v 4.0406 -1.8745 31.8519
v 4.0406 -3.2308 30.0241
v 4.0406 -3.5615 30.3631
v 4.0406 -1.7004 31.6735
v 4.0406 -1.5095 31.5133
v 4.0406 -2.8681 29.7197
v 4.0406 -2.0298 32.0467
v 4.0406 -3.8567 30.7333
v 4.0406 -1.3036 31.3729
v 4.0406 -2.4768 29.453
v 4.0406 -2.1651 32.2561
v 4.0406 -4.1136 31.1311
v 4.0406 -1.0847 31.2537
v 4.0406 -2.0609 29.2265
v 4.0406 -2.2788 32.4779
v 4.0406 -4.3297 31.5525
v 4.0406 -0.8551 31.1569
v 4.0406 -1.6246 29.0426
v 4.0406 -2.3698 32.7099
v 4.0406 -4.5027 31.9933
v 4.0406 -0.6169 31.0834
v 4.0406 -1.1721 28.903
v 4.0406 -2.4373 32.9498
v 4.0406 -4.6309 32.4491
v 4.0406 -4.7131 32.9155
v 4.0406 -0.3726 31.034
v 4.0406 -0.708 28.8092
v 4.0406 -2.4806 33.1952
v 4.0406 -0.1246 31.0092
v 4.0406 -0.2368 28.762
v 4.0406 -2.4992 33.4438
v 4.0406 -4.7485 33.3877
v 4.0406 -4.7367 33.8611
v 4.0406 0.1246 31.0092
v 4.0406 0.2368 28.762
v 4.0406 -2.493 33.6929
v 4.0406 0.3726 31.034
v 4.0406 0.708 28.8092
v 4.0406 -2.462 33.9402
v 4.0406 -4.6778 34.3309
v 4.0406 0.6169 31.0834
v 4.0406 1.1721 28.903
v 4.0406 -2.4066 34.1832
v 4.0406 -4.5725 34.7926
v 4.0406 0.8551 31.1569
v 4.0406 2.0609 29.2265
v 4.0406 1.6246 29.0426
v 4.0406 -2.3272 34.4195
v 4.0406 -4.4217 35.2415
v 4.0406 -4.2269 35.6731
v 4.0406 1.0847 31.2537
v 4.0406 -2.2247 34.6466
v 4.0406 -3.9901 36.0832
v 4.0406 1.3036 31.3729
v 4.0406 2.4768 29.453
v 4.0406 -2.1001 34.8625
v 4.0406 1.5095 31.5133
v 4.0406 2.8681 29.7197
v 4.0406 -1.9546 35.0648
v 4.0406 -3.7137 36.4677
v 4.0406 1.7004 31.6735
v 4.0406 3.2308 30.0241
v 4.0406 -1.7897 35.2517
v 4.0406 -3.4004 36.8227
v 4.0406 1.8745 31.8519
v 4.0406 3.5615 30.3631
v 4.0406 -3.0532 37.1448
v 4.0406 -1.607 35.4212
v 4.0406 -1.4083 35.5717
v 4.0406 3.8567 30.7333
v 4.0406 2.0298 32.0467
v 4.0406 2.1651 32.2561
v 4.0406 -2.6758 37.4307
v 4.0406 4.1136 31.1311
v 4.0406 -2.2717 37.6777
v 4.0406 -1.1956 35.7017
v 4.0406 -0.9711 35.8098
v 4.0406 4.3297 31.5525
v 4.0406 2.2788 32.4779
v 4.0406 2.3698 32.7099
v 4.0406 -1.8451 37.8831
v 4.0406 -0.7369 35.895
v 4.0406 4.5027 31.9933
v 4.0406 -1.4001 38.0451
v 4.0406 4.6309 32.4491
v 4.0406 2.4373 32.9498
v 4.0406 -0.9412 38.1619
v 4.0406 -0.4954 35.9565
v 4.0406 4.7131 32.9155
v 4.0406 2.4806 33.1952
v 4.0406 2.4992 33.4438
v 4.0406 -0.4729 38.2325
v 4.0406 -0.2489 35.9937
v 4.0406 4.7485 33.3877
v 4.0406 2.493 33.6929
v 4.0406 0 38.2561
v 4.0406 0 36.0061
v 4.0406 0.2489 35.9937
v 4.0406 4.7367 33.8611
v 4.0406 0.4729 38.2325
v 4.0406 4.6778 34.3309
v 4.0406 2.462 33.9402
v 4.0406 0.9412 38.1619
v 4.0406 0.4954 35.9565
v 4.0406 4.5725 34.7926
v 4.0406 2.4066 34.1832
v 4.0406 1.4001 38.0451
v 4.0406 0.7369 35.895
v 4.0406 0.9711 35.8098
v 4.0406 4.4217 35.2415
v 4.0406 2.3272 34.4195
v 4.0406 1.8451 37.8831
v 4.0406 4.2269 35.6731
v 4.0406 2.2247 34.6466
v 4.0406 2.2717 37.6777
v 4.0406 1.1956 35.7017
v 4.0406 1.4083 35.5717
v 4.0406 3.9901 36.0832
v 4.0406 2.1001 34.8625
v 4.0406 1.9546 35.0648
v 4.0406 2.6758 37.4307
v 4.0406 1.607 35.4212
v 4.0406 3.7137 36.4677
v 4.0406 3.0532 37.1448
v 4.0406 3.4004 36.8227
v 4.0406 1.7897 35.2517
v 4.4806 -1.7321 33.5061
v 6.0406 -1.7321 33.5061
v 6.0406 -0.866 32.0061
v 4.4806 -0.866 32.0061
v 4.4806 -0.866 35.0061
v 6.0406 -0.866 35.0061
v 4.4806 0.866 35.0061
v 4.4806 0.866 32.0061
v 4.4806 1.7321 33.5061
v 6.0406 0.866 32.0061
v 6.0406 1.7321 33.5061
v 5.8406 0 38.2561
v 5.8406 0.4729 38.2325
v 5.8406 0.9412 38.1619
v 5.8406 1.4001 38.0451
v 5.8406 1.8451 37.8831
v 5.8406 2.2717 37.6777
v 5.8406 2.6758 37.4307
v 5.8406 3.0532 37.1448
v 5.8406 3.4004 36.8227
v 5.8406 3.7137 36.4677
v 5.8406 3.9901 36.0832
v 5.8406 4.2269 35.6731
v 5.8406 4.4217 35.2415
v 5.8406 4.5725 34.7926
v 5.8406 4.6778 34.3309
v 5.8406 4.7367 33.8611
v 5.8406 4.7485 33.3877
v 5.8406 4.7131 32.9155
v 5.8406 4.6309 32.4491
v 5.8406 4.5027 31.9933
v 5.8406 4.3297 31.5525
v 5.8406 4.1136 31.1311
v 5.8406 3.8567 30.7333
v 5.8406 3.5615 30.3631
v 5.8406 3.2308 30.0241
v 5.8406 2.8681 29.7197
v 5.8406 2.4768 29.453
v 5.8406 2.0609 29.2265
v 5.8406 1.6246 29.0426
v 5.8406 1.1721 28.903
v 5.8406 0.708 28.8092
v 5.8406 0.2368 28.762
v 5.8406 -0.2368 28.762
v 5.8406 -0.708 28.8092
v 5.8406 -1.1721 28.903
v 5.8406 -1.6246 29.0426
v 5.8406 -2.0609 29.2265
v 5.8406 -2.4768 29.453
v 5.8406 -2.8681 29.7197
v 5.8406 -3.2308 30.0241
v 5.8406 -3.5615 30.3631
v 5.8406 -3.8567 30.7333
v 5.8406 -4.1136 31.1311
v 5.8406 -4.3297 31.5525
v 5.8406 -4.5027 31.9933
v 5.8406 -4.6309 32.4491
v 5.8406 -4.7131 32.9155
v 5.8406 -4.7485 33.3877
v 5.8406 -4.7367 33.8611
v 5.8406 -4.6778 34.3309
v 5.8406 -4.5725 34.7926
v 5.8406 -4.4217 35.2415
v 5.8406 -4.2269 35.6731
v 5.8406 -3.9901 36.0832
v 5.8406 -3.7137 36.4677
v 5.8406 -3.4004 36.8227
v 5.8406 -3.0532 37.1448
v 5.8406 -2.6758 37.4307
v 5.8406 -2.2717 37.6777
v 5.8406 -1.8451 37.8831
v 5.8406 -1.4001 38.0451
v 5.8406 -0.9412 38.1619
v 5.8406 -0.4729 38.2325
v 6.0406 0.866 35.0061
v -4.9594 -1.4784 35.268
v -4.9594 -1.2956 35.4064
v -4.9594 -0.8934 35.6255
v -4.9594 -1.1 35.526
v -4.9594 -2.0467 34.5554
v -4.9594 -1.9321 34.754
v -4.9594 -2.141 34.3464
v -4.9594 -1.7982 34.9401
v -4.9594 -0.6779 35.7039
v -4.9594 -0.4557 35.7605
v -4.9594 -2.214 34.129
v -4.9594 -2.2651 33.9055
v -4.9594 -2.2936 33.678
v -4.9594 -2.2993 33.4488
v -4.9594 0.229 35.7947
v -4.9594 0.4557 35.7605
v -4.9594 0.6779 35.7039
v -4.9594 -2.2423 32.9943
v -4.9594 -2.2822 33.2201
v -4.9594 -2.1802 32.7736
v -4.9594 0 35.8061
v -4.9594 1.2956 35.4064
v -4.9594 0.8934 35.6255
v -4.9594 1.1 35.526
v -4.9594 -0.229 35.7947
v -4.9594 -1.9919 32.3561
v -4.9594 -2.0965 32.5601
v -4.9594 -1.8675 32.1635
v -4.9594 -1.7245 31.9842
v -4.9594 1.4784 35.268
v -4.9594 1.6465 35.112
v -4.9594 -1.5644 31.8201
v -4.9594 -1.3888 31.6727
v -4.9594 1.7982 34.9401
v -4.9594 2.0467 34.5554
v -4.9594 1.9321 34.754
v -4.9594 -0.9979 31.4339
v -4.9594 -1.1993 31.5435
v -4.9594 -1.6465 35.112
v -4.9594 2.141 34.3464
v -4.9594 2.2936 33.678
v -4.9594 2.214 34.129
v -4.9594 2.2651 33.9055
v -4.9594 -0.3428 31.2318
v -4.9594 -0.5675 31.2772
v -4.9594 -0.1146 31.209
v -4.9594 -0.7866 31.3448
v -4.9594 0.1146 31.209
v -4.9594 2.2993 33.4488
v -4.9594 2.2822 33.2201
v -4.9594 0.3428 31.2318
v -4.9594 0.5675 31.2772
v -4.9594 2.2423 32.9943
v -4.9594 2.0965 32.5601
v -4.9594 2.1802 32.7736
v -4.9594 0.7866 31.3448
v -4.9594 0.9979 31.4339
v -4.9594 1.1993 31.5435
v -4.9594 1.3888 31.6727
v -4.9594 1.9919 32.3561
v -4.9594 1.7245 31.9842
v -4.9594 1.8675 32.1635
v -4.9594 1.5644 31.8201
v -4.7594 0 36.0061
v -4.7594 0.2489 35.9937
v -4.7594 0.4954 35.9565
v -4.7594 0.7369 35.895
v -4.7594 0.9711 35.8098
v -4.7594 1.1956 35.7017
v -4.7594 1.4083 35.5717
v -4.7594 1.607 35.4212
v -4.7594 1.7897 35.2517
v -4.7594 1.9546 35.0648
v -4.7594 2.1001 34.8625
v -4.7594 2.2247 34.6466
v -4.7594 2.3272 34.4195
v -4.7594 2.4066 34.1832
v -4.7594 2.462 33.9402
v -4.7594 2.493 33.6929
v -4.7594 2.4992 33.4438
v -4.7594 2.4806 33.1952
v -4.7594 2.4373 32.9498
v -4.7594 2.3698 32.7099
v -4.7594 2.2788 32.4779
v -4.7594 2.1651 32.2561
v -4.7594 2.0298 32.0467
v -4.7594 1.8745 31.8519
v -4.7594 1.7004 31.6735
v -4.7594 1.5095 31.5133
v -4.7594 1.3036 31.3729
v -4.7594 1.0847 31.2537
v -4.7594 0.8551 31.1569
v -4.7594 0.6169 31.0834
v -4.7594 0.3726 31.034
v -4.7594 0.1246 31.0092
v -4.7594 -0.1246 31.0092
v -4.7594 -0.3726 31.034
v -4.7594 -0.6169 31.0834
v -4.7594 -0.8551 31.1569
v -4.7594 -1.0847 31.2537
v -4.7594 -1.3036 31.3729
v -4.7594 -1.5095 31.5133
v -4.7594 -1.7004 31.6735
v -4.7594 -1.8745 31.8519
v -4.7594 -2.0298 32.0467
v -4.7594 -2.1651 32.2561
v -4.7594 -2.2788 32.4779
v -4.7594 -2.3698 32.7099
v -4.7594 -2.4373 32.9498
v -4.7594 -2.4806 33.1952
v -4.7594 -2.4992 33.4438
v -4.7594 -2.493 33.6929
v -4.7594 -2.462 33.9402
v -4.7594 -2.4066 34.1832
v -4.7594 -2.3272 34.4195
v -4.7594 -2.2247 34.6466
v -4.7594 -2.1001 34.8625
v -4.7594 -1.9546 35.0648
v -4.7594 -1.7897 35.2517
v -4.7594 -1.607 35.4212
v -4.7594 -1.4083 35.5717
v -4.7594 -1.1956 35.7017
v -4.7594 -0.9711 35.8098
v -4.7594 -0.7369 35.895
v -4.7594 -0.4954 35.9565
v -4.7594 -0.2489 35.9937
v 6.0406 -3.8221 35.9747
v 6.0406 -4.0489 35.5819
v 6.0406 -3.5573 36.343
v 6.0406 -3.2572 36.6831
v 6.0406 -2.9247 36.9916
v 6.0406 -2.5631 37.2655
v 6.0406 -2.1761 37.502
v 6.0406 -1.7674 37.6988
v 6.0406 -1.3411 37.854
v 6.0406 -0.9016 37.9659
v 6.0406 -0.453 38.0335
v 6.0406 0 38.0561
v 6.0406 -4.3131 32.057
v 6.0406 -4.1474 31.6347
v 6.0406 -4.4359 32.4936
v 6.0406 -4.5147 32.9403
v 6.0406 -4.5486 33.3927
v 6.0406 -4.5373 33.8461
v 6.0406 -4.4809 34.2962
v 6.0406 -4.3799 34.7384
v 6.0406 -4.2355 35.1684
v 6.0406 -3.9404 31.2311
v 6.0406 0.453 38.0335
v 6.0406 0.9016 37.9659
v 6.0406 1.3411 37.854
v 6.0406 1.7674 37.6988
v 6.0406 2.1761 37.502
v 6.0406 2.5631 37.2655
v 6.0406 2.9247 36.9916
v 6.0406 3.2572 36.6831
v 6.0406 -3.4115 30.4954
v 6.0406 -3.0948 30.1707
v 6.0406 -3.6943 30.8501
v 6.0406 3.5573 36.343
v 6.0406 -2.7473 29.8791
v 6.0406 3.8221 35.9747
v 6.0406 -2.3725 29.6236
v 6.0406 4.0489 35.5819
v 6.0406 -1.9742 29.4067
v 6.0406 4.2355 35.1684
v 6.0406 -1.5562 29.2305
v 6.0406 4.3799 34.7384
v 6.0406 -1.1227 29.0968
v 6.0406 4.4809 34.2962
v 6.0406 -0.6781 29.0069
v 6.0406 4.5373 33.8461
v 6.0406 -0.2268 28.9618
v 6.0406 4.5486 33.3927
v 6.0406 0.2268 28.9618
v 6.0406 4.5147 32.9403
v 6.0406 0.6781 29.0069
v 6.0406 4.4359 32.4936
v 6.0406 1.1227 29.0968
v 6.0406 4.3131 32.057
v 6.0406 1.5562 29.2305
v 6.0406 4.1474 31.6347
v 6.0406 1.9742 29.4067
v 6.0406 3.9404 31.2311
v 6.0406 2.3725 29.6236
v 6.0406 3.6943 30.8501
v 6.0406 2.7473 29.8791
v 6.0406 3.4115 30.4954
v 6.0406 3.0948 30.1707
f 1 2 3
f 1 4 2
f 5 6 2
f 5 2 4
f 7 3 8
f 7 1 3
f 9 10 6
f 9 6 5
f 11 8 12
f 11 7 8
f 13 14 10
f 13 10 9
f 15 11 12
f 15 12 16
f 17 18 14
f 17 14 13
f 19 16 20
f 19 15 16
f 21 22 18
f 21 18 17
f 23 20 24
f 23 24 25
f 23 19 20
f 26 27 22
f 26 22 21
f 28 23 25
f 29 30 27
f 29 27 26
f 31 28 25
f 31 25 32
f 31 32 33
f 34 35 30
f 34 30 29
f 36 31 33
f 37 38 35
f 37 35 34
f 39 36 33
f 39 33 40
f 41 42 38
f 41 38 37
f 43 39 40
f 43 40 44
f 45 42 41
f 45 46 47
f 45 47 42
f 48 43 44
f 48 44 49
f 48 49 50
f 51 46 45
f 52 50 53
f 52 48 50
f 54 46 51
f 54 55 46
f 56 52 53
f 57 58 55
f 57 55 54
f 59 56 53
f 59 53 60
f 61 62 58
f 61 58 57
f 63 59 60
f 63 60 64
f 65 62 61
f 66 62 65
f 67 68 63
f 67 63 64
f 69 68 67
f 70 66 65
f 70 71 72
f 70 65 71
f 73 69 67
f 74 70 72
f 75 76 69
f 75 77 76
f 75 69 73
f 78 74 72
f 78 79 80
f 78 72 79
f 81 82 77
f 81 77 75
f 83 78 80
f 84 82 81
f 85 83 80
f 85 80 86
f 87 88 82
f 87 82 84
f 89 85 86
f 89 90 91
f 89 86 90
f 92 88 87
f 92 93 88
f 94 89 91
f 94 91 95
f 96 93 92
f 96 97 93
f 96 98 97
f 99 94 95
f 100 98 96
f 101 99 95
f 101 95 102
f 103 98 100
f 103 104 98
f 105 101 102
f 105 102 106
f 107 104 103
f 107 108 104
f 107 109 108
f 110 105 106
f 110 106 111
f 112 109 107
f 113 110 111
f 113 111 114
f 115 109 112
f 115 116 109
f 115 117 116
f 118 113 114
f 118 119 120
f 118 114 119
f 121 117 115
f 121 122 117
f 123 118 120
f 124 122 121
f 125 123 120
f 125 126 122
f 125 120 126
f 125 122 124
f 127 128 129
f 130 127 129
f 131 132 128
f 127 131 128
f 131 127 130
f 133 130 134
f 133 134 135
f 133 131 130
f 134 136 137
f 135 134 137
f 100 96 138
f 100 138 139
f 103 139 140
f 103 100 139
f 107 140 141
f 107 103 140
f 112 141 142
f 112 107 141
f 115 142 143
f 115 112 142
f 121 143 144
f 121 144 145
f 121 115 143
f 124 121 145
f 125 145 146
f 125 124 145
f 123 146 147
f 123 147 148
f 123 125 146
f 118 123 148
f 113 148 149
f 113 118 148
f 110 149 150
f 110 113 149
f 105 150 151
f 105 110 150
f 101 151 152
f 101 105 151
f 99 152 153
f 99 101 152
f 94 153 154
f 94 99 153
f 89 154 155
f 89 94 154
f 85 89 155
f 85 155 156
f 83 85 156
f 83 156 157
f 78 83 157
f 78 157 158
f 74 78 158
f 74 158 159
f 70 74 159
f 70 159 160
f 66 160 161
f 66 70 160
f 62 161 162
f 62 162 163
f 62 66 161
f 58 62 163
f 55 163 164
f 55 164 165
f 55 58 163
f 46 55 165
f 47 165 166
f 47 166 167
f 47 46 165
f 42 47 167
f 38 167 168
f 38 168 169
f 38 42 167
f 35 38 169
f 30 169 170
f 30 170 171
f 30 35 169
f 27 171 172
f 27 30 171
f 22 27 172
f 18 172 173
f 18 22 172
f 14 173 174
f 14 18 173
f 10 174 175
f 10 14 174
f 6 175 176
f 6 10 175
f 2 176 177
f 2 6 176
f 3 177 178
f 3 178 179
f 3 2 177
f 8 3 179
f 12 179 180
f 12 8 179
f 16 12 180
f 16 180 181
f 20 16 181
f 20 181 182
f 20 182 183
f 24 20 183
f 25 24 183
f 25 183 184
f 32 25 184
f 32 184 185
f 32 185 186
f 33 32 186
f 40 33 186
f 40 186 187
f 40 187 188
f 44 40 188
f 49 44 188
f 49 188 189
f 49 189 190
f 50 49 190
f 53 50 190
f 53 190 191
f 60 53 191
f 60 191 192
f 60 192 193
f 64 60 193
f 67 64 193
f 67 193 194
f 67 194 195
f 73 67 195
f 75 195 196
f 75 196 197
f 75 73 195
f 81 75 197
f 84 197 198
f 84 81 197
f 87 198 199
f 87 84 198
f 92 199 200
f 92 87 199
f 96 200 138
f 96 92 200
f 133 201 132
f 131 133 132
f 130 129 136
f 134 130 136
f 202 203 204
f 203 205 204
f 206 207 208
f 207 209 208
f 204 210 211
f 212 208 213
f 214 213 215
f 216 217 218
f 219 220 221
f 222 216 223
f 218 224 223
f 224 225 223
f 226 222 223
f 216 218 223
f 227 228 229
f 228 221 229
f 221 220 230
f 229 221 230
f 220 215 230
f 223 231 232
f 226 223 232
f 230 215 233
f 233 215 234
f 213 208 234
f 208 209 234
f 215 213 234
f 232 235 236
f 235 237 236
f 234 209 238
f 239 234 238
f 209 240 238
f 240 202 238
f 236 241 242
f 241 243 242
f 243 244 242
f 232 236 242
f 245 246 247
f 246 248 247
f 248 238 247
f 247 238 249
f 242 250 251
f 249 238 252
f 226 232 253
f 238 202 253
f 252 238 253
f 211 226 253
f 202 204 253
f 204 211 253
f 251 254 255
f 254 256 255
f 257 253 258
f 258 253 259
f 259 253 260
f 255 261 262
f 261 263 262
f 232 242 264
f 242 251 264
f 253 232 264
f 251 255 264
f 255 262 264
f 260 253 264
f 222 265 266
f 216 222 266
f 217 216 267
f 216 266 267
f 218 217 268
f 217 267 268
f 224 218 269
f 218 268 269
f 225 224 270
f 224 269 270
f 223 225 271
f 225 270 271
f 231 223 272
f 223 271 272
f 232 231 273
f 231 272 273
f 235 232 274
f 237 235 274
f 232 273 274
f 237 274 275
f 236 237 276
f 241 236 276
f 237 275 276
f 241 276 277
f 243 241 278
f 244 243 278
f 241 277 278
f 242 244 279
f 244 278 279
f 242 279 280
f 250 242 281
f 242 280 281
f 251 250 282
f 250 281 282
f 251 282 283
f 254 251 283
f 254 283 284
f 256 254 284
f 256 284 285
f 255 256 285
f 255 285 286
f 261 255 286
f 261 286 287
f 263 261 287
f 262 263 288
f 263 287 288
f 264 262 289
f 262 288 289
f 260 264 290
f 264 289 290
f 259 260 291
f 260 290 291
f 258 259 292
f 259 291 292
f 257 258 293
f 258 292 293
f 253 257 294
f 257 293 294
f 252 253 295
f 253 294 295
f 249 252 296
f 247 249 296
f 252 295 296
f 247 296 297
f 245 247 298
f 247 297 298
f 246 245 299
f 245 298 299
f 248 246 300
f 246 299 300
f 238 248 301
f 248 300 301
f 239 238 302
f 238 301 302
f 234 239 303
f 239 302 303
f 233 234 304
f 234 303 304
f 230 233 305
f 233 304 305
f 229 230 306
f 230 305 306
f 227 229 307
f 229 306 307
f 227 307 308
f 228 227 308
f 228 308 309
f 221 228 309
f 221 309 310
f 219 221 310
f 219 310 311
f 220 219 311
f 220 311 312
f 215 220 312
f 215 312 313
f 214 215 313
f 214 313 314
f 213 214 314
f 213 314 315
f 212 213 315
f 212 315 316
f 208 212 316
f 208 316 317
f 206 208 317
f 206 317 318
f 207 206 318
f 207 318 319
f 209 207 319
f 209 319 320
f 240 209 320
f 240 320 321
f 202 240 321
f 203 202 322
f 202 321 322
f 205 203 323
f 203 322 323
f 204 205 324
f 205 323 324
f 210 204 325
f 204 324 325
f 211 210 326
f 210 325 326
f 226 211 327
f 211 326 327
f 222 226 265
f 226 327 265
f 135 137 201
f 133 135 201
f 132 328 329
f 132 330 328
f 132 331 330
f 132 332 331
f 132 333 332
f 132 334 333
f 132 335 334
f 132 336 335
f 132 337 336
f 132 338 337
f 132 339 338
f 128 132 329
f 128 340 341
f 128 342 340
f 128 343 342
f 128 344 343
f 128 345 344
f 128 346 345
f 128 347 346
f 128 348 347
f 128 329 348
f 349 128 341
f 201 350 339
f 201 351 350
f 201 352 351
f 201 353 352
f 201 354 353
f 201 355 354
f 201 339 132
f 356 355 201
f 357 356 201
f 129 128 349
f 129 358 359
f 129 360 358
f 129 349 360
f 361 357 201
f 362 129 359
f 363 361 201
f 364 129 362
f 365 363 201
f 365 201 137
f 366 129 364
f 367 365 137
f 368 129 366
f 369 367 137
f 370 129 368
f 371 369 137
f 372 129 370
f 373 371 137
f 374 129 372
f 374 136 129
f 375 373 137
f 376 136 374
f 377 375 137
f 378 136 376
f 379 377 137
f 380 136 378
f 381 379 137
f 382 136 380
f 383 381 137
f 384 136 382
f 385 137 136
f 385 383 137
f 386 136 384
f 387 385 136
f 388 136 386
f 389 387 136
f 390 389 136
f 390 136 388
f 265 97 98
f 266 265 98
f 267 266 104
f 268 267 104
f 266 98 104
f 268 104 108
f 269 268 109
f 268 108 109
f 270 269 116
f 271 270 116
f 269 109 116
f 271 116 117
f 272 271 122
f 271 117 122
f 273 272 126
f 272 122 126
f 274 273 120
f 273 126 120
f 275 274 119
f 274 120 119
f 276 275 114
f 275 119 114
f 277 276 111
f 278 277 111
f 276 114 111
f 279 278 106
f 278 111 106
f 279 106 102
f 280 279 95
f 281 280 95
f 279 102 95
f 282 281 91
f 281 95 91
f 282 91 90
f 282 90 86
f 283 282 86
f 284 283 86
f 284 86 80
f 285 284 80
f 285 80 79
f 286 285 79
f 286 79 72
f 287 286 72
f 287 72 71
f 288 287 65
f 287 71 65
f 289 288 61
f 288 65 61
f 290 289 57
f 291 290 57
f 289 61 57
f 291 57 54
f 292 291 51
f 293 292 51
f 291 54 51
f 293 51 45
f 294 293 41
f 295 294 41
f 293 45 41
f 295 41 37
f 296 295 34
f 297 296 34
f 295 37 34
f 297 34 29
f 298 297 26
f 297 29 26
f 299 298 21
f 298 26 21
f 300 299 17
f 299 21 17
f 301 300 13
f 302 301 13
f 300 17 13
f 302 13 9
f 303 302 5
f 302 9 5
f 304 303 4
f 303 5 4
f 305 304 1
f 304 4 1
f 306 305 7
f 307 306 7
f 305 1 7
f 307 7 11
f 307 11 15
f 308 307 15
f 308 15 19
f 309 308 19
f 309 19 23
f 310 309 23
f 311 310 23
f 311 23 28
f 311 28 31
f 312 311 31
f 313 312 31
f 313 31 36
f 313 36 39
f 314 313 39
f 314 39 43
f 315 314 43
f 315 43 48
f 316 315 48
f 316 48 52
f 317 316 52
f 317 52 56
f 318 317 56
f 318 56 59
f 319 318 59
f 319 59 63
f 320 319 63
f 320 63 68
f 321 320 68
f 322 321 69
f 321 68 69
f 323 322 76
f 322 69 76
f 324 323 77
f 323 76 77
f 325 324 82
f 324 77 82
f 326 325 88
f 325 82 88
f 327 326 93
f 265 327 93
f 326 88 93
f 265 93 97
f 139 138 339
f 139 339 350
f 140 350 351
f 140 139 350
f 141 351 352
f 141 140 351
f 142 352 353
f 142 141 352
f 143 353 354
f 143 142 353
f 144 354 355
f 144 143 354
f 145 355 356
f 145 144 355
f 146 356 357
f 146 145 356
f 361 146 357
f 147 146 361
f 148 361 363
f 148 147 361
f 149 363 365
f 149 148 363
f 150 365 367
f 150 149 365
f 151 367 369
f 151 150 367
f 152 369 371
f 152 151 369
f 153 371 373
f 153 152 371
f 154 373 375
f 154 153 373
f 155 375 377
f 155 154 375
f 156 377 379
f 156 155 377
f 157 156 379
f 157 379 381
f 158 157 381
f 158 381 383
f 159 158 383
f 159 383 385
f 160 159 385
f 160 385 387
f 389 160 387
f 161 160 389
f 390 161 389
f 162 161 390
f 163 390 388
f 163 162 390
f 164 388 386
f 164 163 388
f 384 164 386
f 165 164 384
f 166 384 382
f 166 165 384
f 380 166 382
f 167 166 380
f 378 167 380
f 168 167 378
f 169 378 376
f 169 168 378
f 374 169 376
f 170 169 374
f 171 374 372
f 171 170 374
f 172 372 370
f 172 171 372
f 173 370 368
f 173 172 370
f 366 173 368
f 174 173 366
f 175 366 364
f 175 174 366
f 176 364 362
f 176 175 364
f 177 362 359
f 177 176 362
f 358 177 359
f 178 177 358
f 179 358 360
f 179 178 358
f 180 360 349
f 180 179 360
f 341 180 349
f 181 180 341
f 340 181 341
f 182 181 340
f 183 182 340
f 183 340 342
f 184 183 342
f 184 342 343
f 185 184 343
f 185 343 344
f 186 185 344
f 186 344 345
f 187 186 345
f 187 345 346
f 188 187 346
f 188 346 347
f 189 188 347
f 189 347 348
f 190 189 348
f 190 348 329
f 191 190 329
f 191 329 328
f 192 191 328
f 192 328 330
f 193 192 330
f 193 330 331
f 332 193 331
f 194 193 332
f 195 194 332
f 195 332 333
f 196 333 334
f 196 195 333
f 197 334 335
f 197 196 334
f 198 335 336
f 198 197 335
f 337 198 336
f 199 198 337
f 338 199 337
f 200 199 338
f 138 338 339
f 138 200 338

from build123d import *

# Parameters (mm, degrees)
F0_W     = 9
F0_H     = 2.5
F2_SIZE  = 0.2
F4_DEPTH = 1.56


with BuildPart() as f1:
    # F0 (on Front) → F1 (revolve)
    with BuildSketch(Plane.XZ):
        with Locations((-0.4593508661, 34.7560998052)):
            Rectangle(F0_W, F0_H)
        Polygon((4.0406491339, 38.2560998052), (4.0406491339, 36.0060998052), (4.0406491339, 33.5060998052), (6.0406491339, 33.5060998052), (6.0406491339, 38.2560998052), align=None)
    revolve(axis=Axis((-0.4593508661, 0, 33.5060998052), (-1, 0, 0)))

    # F2
    f2_edges = [f1.edges().sort_by_distance(p)[0] for p in [
        (-4.959351, 0, 31.0061),
        (6.040649, 0, 28.7561),
    ]]
    chamfer(f2_edges, length=F2_SIZE)

    # F3 (on face) → F4 (cut)
    with BuildSketch(Plane.YZ.offset(6.0406491339)):
        Polygon((0.8660254038, 35.0060998052), (-0.8660254038, 35.0060998052), (-1.7320508076, 33.5060998052), (-0.8660254038, 32.0060998052), (0.8660254038, 32.0060998052), (1.7320508076, 33.5060998052), align=None)
    extrude(amount=-F4_DEPTH, mode=Mode.SUBTRACT)


solid = f1.part
